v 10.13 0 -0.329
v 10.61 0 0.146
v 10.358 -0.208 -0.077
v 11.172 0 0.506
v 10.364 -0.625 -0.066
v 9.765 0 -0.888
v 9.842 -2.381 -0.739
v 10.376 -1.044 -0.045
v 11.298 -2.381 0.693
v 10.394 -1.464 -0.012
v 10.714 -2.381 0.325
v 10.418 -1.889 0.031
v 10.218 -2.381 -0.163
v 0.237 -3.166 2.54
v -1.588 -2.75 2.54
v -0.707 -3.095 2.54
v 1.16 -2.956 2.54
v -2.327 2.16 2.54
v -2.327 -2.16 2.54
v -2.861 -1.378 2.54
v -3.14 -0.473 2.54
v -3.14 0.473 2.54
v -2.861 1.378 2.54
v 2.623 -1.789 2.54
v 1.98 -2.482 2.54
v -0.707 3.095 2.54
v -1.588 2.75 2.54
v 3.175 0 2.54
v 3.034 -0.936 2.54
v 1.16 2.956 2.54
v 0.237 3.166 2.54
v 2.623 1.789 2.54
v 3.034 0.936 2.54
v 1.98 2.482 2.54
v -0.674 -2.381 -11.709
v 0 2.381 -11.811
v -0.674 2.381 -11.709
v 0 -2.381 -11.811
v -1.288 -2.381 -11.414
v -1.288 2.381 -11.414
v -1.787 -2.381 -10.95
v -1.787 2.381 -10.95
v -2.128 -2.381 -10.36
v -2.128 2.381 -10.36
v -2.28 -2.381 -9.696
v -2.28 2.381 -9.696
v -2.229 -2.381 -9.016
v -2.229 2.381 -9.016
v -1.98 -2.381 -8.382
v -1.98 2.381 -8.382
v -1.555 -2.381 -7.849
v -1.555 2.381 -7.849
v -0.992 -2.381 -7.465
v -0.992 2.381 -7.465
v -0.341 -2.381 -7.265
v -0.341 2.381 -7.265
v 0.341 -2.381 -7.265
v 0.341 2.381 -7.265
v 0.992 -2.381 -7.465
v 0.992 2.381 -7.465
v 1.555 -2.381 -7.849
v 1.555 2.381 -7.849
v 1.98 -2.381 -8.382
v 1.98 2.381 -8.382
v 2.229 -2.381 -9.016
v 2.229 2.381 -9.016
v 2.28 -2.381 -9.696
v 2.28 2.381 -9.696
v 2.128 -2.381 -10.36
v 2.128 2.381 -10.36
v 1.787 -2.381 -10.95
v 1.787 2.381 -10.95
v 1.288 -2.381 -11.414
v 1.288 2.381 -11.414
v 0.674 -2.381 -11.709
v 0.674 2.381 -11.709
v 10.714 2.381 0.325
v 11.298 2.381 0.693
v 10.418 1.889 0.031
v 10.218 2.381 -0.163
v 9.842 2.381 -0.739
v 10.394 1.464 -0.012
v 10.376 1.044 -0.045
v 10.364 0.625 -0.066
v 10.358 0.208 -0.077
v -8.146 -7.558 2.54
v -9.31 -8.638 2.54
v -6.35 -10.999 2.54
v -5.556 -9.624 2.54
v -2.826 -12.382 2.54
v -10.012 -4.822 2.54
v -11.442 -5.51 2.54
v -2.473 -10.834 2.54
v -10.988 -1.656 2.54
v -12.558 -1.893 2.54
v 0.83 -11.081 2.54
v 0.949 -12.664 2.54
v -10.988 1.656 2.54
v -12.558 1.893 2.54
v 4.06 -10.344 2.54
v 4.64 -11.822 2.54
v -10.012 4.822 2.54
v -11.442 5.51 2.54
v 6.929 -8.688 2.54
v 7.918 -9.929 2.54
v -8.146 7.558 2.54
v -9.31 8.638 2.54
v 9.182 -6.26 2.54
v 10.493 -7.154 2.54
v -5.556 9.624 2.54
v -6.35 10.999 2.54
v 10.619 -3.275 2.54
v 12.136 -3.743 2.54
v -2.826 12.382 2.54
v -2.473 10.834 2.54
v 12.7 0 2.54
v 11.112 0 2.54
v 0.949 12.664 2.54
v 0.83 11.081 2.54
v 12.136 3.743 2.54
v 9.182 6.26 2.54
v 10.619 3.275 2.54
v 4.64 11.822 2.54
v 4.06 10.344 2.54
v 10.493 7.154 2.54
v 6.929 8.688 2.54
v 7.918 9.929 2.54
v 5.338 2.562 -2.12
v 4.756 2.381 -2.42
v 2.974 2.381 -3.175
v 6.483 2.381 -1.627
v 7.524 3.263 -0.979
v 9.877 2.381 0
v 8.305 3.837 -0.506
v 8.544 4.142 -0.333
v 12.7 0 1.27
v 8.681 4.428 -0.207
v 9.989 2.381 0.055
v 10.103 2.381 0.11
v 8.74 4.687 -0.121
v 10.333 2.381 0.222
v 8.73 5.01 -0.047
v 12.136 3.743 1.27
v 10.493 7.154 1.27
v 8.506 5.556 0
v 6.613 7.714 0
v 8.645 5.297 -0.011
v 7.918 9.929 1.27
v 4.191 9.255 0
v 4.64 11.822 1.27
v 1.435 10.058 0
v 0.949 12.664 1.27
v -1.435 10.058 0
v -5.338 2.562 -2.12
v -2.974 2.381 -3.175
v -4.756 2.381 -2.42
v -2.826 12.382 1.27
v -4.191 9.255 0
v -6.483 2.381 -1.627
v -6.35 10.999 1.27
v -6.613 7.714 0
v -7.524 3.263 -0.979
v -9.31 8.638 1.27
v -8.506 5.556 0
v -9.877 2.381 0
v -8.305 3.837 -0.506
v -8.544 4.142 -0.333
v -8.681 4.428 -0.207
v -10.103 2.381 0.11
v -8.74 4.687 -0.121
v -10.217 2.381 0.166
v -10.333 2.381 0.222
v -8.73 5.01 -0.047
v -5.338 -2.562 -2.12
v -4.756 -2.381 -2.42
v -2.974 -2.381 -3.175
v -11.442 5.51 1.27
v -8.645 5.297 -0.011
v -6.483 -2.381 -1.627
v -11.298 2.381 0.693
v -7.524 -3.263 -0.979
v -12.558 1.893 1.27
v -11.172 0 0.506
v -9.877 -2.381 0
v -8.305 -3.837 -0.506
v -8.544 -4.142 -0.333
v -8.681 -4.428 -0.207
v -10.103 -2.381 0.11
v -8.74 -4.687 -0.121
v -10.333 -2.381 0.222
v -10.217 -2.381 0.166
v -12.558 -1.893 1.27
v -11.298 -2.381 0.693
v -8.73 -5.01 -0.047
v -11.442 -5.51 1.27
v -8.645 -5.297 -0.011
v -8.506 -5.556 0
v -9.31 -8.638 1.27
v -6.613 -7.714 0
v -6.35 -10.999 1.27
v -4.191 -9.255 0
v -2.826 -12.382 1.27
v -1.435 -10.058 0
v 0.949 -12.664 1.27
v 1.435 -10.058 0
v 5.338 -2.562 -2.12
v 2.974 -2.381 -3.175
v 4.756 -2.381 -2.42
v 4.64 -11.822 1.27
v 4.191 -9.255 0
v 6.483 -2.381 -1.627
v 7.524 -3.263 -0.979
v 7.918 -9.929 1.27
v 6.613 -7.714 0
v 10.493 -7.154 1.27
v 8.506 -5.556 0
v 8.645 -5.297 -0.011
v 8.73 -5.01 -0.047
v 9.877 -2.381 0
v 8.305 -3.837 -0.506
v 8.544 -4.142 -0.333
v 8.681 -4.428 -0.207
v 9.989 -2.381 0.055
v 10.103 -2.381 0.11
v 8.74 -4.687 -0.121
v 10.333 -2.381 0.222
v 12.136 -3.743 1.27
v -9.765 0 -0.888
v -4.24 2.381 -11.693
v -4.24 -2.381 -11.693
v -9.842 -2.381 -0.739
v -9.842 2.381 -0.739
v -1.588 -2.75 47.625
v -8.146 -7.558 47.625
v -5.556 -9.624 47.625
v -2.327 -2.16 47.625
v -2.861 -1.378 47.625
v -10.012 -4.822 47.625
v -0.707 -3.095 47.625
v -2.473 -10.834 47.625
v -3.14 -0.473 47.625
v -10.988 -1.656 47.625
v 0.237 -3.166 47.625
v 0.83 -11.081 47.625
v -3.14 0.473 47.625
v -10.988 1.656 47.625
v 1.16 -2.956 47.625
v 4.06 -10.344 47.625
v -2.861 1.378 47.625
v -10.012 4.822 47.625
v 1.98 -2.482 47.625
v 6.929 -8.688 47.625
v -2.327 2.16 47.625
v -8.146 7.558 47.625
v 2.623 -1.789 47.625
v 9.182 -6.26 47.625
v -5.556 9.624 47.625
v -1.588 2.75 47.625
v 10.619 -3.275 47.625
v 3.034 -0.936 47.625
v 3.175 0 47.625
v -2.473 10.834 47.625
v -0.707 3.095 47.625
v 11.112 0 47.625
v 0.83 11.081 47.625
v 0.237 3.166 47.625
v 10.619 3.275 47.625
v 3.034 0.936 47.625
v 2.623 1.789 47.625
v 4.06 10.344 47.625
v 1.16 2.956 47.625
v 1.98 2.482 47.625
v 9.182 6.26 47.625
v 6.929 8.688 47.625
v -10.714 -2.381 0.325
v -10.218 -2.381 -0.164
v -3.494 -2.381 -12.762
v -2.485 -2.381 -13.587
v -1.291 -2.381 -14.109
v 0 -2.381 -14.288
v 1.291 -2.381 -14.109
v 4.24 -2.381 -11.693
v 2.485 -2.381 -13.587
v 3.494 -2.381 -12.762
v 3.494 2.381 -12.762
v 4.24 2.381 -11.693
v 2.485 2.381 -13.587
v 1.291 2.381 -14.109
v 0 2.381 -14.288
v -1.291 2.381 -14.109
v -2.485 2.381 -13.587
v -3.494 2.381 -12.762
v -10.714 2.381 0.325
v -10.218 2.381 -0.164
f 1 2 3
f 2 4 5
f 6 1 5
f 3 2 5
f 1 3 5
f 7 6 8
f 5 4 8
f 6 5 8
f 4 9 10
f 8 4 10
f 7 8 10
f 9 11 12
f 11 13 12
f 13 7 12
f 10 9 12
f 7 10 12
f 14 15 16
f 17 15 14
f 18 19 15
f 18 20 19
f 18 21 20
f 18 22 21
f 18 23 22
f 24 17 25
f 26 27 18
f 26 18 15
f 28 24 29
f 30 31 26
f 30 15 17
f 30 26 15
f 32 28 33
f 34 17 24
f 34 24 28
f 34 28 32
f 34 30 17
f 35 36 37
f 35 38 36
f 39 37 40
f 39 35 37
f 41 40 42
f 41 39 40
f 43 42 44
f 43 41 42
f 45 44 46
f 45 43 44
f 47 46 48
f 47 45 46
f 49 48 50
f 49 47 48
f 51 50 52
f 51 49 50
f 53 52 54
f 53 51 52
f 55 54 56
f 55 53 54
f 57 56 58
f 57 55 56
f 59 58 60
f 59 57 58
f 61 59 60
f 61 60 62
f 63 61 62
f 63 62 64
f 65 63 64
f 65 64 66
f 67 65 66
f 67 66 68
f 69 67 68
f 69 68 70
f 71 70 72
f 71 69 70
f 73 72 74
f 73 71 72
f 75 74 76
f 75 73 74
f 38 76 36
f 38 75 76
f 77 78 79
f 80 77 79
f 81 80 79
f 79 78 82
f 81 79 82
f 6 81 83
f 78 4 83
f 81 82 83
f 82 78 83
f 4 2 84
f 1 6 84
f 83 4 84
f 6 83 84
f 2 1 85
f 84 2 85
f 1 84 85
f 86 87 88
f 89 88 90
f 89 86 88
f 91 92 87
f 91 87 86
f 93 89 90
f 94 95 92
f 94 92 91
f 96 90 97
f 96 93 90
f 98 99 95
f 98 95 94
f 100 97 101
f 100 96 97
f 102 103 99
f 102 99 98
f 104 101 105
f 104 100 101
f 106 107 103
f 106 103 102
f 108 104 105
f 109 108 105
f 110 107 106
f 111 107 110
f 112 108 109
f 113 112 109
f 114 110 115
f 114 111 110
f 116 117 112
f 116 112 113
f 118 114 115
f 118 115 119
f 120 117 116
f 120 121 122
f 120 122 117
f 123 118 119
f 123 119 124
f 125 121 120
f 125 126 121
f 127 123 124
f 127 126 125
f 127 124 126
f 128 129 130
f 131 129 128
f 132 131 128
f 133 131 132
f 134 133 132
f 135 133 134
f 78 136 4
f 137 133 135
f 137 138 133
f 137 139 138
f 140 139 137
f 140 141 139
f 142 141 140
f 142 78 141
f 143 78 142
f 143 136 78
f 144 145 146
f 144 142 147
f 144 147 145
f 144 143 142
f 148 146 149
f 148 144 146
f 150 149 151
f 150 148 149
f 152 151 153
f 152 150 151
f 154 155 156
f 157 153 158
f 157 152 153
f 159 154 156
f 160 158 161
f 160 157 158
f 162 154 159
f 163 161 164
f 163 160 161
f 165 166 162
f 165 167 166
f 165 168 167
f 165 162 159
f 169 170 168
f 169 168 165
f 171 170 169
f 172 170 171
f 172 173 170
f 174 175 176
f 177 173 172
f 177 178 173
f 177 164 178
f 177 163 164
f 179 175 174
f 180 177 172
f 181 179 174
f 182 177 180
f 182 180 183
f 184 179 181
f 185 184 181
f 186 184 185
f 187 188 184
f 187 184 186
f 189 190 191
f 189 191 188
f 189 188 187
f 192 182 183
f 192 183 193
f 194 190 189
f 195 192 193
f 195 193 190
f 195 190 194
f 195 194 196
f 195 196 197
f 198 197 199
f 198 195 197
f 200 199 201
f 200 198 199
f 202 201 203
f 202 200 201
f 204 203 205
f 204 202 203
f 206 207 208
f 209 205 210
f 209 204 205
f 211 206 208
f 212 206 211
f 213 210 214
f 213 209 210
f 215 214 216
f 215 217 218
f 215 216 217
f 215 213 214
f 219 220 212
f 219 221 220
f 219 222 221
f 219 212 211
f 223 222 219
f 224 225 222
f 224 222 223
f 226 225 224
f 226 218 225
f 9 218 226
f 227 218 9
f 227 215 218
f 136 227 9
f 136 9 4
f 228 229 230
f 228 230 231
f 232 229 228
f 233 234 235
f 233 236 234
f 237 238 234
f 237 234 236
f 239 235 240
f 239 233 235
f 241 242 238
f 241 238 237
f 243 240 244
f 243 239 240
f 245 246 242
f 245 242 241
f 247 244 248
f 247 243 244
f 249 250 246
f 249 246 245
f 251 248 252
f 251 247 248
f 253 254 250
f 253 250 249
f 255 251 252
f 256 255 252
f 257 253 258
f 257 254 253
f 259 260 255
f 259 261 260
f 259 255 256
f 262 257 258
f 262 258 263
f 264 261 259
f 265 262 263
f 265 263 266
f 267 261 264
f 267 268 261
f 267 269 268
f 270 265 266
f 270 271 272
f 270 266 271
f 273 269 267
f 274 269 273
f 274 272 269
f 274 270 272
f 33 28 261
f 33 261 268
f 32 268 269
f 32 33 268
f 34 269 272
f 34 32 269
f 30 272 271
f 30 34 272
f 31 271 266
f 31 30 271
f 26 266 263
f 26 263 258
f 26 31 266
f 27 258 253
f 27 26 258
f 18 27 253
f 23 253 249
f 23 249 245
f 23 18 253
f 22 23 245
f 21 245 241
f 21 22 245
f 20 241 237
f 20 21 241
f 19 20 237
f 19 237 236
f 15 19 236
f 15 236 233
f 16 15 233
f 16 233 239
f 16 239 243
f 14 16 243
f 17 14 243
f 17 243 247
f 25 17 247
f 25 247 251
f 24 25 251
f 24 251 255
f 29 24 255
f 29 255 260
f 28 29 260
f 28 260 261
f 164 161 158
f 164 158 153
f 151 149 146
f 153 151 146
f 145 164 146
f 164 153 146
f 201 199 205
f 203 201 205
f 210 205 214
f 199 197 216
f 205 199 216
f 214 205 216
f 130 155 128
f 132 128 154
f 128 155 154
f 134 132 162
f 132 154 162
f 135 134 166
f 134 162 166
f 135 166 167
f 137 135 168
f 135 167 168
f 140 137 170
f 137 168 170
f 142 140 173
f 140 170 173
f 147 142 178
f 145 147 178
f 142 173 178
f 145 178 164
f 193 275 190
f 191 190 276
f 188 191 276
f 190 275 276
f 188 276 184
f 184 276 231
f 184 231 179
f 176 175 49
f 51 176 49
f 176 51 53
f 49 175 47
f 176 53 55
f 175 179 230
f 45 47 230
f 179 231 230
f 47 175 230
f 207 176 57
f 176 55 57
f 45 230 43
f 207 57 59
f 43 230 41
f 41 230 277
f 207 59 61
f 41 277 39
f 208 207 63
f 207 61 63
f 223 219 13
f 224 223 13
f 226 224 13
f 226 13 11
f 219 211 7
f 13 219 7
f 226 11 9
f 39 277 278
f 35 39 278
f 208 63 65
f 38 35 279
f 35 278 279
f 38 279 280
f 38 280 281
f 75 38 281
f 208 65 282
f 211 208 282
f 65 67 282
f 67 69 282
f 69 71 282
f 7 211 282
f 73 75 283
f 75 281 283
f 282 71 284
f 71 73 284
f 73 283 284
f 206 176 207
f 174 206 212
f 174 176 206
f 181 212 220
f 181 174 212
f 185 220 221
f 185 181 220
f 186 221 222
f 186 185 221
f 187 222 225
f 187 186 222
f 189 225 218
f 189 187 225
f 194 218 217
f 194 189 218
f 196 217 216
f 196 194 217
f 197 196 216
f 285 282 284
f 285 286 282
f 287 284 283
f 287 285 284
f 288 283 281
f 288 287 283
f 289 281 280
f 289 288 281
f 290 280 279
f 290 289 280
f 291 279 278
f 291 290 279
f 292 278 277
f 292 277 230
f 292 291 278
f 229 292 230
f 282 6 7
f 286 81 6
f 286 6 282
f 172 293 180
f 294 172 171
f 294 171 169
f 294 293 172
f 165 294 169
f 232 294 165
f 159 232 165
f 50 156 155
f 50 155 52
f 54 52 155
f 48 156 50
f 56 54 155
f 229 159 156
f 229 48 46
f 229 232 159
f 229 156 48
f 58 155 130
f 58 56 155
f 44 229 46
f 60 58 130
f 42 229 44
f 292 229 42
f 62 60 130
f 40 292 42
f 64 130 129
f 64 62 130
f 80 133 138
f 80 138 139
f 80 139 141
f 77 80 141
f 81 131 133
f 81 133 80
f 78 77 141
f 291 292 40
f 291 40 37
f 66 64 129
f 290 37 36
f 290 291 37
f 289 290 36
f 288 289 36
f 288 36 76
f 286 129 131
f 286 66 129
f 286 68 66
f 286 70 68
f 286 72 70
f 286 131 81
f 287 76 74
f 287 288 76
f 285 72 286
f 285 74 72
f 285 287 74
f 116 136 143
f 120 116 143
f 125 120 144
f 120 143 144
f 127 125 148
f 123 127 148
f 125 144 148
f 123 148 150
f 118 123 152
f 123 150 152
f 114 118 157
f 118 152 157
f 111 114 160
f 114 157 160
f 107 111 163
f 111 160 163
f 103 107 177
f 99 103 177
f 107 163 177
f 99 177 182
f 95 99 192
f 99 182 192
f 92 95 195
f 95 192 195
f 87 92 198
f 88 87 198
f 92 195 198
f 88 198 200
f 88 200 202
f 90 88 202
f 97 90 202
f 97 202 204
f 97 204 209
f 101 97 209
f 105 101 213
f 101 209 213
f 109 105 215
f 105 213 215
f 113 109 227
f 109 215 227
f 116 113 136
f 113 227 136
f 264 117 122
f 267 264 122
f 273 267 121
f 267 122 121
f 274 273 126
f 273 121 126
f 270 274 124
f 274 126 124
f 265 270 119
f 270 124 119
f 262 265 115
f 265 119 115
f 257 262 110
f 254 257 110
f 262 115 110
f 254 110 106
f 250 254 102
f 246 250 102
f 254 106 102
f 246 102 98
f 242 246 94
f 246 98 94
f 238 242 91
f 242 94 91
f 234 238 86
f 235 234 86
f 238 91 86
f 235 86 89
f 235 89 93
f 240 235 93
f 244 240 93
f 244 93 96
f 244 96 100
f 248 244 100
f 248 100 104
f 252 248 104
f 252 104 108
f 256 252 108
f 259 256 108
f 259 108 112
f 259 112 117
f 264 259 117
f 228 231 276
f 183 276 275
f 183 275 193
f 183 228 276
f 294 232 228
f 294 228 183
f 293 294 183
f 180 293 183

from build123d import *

# Parameters (mm, degrees)
SKETCH1_R           = 12.7
SKETCH1_R_2         = 11.1125
SKETCH1_R_3         = 3.175
BOSS_EXTRUDE1_DEPTH = 2.54
SKETCH1_3_R         = 11.1125
SKETCH1_3_R_2       = 3.175
BOSS_EXTRUDE2_DEPTH = 47.625
CHAMFER1_SIZE       = 2.54
CHAMFER1_SIZE2      = 1.27
SKETCH2_R           = 2.286
BOSS_EXTRUDE3_DEPTH = 2.38125
FILLET1_R           = 3.175
FILLET2_R           = 3.175


with BuildPart() as part:
    # Sketch1 → Boss-Extrude1 (new body)
    # profile 1 of 3: a face of its own
    with BuildSketch(Plane.XY):
        Circle(SKETCH1_R)
        Circle(SKETCH1_R_2, mode=Mode.SUBTRACT)
    # profile 2 of 3: a face of its own
    with BuildSketch(Plane.XY):
        Circle(SKETCH1_R_2)
        Circle(SKETCH1_R_3, mode=Mode.SUBTRACT)
    # profile 3 of 3: a face of its own
    with BuildSketch(Plane.XY):
        Circle(SKETCH1_R_3)
    extrude(amount=BOSS_EXTRUDE1_DEPTH)

    # Sketch1<3> → Boss-Extrude2 (add)
    with BuildSketch(Plane.XY):
        Circle(SKETCH1_3_R)
        Circle(SKETCH1_3_R_2, mode=Mode.SUBTRACT)
    extrude(amount=BOSS_EXTRUDE2_DEPTH)

    # Chamfer1
    chamfer1_edges = [part.edges().sort_by_distance(p)[0] for p in [
        (-12.7, 0, 0),
    ]]
    chamfer1_side = [part.faces().sort_by_distance(p)[0] for p in [
        (0, 0, 0),
    ]]
    chamfer(chamfer1_edges, length=CHAMFER1_SIZE, length2=CHAMFER1_SIZE2, reference=chamfer1_side[0])

    # Sketch2 → Boss-Extrude3 (add, symmetric)
    with BuildSketch(Plane(origin=(0, 0, 0), x_dir=(1, 0, 0), z_dir=(0, 1, 0))):
        with BuildLine():
            Line((-4.240295204, 11.693248793), (-11.1125, -1.74625))
            Line((-11.1125, -1.74625), (11.1125, -1.74625))
            Line((11.1125, -1.74625), (4.240295204, 11.693248793))
            ThreePointArc((4.240295204, 11.693248793), (0, 14.2875), (-4.240295204, 11.693248793))
        make_face()
        with Locations(Location((0, 9.525, 0), (0, 0, 90))):
            Circle(SKETCH2_R, mode=Mode.SUBTRACT)
    extrude(amount=BOSS_EXTRUDE3_DEPTH, both=True)

    # Fillet1
    fillet1_edges = [part.edges().sort_by_distance(p)[0] for p in [
        (10.263836295, -1.194873852, 0.086576696),
        (-10.240026318, 0, 0.040013159),
        (10.263836295, 1.194873852, 0.086576696),
    ]]
    fillet(fillet1_edges, radius=FILLET1_R)

    # Fillet2
    fillet2_edges = [part.edges().sort_by_distance(p)[0] for p in [
        (0, 2.38125, 0),
        (0, -2.38125, 0),
    ]]
    fillet(fillet2_edges, radius=FILLET2_R)


solid = part.part
